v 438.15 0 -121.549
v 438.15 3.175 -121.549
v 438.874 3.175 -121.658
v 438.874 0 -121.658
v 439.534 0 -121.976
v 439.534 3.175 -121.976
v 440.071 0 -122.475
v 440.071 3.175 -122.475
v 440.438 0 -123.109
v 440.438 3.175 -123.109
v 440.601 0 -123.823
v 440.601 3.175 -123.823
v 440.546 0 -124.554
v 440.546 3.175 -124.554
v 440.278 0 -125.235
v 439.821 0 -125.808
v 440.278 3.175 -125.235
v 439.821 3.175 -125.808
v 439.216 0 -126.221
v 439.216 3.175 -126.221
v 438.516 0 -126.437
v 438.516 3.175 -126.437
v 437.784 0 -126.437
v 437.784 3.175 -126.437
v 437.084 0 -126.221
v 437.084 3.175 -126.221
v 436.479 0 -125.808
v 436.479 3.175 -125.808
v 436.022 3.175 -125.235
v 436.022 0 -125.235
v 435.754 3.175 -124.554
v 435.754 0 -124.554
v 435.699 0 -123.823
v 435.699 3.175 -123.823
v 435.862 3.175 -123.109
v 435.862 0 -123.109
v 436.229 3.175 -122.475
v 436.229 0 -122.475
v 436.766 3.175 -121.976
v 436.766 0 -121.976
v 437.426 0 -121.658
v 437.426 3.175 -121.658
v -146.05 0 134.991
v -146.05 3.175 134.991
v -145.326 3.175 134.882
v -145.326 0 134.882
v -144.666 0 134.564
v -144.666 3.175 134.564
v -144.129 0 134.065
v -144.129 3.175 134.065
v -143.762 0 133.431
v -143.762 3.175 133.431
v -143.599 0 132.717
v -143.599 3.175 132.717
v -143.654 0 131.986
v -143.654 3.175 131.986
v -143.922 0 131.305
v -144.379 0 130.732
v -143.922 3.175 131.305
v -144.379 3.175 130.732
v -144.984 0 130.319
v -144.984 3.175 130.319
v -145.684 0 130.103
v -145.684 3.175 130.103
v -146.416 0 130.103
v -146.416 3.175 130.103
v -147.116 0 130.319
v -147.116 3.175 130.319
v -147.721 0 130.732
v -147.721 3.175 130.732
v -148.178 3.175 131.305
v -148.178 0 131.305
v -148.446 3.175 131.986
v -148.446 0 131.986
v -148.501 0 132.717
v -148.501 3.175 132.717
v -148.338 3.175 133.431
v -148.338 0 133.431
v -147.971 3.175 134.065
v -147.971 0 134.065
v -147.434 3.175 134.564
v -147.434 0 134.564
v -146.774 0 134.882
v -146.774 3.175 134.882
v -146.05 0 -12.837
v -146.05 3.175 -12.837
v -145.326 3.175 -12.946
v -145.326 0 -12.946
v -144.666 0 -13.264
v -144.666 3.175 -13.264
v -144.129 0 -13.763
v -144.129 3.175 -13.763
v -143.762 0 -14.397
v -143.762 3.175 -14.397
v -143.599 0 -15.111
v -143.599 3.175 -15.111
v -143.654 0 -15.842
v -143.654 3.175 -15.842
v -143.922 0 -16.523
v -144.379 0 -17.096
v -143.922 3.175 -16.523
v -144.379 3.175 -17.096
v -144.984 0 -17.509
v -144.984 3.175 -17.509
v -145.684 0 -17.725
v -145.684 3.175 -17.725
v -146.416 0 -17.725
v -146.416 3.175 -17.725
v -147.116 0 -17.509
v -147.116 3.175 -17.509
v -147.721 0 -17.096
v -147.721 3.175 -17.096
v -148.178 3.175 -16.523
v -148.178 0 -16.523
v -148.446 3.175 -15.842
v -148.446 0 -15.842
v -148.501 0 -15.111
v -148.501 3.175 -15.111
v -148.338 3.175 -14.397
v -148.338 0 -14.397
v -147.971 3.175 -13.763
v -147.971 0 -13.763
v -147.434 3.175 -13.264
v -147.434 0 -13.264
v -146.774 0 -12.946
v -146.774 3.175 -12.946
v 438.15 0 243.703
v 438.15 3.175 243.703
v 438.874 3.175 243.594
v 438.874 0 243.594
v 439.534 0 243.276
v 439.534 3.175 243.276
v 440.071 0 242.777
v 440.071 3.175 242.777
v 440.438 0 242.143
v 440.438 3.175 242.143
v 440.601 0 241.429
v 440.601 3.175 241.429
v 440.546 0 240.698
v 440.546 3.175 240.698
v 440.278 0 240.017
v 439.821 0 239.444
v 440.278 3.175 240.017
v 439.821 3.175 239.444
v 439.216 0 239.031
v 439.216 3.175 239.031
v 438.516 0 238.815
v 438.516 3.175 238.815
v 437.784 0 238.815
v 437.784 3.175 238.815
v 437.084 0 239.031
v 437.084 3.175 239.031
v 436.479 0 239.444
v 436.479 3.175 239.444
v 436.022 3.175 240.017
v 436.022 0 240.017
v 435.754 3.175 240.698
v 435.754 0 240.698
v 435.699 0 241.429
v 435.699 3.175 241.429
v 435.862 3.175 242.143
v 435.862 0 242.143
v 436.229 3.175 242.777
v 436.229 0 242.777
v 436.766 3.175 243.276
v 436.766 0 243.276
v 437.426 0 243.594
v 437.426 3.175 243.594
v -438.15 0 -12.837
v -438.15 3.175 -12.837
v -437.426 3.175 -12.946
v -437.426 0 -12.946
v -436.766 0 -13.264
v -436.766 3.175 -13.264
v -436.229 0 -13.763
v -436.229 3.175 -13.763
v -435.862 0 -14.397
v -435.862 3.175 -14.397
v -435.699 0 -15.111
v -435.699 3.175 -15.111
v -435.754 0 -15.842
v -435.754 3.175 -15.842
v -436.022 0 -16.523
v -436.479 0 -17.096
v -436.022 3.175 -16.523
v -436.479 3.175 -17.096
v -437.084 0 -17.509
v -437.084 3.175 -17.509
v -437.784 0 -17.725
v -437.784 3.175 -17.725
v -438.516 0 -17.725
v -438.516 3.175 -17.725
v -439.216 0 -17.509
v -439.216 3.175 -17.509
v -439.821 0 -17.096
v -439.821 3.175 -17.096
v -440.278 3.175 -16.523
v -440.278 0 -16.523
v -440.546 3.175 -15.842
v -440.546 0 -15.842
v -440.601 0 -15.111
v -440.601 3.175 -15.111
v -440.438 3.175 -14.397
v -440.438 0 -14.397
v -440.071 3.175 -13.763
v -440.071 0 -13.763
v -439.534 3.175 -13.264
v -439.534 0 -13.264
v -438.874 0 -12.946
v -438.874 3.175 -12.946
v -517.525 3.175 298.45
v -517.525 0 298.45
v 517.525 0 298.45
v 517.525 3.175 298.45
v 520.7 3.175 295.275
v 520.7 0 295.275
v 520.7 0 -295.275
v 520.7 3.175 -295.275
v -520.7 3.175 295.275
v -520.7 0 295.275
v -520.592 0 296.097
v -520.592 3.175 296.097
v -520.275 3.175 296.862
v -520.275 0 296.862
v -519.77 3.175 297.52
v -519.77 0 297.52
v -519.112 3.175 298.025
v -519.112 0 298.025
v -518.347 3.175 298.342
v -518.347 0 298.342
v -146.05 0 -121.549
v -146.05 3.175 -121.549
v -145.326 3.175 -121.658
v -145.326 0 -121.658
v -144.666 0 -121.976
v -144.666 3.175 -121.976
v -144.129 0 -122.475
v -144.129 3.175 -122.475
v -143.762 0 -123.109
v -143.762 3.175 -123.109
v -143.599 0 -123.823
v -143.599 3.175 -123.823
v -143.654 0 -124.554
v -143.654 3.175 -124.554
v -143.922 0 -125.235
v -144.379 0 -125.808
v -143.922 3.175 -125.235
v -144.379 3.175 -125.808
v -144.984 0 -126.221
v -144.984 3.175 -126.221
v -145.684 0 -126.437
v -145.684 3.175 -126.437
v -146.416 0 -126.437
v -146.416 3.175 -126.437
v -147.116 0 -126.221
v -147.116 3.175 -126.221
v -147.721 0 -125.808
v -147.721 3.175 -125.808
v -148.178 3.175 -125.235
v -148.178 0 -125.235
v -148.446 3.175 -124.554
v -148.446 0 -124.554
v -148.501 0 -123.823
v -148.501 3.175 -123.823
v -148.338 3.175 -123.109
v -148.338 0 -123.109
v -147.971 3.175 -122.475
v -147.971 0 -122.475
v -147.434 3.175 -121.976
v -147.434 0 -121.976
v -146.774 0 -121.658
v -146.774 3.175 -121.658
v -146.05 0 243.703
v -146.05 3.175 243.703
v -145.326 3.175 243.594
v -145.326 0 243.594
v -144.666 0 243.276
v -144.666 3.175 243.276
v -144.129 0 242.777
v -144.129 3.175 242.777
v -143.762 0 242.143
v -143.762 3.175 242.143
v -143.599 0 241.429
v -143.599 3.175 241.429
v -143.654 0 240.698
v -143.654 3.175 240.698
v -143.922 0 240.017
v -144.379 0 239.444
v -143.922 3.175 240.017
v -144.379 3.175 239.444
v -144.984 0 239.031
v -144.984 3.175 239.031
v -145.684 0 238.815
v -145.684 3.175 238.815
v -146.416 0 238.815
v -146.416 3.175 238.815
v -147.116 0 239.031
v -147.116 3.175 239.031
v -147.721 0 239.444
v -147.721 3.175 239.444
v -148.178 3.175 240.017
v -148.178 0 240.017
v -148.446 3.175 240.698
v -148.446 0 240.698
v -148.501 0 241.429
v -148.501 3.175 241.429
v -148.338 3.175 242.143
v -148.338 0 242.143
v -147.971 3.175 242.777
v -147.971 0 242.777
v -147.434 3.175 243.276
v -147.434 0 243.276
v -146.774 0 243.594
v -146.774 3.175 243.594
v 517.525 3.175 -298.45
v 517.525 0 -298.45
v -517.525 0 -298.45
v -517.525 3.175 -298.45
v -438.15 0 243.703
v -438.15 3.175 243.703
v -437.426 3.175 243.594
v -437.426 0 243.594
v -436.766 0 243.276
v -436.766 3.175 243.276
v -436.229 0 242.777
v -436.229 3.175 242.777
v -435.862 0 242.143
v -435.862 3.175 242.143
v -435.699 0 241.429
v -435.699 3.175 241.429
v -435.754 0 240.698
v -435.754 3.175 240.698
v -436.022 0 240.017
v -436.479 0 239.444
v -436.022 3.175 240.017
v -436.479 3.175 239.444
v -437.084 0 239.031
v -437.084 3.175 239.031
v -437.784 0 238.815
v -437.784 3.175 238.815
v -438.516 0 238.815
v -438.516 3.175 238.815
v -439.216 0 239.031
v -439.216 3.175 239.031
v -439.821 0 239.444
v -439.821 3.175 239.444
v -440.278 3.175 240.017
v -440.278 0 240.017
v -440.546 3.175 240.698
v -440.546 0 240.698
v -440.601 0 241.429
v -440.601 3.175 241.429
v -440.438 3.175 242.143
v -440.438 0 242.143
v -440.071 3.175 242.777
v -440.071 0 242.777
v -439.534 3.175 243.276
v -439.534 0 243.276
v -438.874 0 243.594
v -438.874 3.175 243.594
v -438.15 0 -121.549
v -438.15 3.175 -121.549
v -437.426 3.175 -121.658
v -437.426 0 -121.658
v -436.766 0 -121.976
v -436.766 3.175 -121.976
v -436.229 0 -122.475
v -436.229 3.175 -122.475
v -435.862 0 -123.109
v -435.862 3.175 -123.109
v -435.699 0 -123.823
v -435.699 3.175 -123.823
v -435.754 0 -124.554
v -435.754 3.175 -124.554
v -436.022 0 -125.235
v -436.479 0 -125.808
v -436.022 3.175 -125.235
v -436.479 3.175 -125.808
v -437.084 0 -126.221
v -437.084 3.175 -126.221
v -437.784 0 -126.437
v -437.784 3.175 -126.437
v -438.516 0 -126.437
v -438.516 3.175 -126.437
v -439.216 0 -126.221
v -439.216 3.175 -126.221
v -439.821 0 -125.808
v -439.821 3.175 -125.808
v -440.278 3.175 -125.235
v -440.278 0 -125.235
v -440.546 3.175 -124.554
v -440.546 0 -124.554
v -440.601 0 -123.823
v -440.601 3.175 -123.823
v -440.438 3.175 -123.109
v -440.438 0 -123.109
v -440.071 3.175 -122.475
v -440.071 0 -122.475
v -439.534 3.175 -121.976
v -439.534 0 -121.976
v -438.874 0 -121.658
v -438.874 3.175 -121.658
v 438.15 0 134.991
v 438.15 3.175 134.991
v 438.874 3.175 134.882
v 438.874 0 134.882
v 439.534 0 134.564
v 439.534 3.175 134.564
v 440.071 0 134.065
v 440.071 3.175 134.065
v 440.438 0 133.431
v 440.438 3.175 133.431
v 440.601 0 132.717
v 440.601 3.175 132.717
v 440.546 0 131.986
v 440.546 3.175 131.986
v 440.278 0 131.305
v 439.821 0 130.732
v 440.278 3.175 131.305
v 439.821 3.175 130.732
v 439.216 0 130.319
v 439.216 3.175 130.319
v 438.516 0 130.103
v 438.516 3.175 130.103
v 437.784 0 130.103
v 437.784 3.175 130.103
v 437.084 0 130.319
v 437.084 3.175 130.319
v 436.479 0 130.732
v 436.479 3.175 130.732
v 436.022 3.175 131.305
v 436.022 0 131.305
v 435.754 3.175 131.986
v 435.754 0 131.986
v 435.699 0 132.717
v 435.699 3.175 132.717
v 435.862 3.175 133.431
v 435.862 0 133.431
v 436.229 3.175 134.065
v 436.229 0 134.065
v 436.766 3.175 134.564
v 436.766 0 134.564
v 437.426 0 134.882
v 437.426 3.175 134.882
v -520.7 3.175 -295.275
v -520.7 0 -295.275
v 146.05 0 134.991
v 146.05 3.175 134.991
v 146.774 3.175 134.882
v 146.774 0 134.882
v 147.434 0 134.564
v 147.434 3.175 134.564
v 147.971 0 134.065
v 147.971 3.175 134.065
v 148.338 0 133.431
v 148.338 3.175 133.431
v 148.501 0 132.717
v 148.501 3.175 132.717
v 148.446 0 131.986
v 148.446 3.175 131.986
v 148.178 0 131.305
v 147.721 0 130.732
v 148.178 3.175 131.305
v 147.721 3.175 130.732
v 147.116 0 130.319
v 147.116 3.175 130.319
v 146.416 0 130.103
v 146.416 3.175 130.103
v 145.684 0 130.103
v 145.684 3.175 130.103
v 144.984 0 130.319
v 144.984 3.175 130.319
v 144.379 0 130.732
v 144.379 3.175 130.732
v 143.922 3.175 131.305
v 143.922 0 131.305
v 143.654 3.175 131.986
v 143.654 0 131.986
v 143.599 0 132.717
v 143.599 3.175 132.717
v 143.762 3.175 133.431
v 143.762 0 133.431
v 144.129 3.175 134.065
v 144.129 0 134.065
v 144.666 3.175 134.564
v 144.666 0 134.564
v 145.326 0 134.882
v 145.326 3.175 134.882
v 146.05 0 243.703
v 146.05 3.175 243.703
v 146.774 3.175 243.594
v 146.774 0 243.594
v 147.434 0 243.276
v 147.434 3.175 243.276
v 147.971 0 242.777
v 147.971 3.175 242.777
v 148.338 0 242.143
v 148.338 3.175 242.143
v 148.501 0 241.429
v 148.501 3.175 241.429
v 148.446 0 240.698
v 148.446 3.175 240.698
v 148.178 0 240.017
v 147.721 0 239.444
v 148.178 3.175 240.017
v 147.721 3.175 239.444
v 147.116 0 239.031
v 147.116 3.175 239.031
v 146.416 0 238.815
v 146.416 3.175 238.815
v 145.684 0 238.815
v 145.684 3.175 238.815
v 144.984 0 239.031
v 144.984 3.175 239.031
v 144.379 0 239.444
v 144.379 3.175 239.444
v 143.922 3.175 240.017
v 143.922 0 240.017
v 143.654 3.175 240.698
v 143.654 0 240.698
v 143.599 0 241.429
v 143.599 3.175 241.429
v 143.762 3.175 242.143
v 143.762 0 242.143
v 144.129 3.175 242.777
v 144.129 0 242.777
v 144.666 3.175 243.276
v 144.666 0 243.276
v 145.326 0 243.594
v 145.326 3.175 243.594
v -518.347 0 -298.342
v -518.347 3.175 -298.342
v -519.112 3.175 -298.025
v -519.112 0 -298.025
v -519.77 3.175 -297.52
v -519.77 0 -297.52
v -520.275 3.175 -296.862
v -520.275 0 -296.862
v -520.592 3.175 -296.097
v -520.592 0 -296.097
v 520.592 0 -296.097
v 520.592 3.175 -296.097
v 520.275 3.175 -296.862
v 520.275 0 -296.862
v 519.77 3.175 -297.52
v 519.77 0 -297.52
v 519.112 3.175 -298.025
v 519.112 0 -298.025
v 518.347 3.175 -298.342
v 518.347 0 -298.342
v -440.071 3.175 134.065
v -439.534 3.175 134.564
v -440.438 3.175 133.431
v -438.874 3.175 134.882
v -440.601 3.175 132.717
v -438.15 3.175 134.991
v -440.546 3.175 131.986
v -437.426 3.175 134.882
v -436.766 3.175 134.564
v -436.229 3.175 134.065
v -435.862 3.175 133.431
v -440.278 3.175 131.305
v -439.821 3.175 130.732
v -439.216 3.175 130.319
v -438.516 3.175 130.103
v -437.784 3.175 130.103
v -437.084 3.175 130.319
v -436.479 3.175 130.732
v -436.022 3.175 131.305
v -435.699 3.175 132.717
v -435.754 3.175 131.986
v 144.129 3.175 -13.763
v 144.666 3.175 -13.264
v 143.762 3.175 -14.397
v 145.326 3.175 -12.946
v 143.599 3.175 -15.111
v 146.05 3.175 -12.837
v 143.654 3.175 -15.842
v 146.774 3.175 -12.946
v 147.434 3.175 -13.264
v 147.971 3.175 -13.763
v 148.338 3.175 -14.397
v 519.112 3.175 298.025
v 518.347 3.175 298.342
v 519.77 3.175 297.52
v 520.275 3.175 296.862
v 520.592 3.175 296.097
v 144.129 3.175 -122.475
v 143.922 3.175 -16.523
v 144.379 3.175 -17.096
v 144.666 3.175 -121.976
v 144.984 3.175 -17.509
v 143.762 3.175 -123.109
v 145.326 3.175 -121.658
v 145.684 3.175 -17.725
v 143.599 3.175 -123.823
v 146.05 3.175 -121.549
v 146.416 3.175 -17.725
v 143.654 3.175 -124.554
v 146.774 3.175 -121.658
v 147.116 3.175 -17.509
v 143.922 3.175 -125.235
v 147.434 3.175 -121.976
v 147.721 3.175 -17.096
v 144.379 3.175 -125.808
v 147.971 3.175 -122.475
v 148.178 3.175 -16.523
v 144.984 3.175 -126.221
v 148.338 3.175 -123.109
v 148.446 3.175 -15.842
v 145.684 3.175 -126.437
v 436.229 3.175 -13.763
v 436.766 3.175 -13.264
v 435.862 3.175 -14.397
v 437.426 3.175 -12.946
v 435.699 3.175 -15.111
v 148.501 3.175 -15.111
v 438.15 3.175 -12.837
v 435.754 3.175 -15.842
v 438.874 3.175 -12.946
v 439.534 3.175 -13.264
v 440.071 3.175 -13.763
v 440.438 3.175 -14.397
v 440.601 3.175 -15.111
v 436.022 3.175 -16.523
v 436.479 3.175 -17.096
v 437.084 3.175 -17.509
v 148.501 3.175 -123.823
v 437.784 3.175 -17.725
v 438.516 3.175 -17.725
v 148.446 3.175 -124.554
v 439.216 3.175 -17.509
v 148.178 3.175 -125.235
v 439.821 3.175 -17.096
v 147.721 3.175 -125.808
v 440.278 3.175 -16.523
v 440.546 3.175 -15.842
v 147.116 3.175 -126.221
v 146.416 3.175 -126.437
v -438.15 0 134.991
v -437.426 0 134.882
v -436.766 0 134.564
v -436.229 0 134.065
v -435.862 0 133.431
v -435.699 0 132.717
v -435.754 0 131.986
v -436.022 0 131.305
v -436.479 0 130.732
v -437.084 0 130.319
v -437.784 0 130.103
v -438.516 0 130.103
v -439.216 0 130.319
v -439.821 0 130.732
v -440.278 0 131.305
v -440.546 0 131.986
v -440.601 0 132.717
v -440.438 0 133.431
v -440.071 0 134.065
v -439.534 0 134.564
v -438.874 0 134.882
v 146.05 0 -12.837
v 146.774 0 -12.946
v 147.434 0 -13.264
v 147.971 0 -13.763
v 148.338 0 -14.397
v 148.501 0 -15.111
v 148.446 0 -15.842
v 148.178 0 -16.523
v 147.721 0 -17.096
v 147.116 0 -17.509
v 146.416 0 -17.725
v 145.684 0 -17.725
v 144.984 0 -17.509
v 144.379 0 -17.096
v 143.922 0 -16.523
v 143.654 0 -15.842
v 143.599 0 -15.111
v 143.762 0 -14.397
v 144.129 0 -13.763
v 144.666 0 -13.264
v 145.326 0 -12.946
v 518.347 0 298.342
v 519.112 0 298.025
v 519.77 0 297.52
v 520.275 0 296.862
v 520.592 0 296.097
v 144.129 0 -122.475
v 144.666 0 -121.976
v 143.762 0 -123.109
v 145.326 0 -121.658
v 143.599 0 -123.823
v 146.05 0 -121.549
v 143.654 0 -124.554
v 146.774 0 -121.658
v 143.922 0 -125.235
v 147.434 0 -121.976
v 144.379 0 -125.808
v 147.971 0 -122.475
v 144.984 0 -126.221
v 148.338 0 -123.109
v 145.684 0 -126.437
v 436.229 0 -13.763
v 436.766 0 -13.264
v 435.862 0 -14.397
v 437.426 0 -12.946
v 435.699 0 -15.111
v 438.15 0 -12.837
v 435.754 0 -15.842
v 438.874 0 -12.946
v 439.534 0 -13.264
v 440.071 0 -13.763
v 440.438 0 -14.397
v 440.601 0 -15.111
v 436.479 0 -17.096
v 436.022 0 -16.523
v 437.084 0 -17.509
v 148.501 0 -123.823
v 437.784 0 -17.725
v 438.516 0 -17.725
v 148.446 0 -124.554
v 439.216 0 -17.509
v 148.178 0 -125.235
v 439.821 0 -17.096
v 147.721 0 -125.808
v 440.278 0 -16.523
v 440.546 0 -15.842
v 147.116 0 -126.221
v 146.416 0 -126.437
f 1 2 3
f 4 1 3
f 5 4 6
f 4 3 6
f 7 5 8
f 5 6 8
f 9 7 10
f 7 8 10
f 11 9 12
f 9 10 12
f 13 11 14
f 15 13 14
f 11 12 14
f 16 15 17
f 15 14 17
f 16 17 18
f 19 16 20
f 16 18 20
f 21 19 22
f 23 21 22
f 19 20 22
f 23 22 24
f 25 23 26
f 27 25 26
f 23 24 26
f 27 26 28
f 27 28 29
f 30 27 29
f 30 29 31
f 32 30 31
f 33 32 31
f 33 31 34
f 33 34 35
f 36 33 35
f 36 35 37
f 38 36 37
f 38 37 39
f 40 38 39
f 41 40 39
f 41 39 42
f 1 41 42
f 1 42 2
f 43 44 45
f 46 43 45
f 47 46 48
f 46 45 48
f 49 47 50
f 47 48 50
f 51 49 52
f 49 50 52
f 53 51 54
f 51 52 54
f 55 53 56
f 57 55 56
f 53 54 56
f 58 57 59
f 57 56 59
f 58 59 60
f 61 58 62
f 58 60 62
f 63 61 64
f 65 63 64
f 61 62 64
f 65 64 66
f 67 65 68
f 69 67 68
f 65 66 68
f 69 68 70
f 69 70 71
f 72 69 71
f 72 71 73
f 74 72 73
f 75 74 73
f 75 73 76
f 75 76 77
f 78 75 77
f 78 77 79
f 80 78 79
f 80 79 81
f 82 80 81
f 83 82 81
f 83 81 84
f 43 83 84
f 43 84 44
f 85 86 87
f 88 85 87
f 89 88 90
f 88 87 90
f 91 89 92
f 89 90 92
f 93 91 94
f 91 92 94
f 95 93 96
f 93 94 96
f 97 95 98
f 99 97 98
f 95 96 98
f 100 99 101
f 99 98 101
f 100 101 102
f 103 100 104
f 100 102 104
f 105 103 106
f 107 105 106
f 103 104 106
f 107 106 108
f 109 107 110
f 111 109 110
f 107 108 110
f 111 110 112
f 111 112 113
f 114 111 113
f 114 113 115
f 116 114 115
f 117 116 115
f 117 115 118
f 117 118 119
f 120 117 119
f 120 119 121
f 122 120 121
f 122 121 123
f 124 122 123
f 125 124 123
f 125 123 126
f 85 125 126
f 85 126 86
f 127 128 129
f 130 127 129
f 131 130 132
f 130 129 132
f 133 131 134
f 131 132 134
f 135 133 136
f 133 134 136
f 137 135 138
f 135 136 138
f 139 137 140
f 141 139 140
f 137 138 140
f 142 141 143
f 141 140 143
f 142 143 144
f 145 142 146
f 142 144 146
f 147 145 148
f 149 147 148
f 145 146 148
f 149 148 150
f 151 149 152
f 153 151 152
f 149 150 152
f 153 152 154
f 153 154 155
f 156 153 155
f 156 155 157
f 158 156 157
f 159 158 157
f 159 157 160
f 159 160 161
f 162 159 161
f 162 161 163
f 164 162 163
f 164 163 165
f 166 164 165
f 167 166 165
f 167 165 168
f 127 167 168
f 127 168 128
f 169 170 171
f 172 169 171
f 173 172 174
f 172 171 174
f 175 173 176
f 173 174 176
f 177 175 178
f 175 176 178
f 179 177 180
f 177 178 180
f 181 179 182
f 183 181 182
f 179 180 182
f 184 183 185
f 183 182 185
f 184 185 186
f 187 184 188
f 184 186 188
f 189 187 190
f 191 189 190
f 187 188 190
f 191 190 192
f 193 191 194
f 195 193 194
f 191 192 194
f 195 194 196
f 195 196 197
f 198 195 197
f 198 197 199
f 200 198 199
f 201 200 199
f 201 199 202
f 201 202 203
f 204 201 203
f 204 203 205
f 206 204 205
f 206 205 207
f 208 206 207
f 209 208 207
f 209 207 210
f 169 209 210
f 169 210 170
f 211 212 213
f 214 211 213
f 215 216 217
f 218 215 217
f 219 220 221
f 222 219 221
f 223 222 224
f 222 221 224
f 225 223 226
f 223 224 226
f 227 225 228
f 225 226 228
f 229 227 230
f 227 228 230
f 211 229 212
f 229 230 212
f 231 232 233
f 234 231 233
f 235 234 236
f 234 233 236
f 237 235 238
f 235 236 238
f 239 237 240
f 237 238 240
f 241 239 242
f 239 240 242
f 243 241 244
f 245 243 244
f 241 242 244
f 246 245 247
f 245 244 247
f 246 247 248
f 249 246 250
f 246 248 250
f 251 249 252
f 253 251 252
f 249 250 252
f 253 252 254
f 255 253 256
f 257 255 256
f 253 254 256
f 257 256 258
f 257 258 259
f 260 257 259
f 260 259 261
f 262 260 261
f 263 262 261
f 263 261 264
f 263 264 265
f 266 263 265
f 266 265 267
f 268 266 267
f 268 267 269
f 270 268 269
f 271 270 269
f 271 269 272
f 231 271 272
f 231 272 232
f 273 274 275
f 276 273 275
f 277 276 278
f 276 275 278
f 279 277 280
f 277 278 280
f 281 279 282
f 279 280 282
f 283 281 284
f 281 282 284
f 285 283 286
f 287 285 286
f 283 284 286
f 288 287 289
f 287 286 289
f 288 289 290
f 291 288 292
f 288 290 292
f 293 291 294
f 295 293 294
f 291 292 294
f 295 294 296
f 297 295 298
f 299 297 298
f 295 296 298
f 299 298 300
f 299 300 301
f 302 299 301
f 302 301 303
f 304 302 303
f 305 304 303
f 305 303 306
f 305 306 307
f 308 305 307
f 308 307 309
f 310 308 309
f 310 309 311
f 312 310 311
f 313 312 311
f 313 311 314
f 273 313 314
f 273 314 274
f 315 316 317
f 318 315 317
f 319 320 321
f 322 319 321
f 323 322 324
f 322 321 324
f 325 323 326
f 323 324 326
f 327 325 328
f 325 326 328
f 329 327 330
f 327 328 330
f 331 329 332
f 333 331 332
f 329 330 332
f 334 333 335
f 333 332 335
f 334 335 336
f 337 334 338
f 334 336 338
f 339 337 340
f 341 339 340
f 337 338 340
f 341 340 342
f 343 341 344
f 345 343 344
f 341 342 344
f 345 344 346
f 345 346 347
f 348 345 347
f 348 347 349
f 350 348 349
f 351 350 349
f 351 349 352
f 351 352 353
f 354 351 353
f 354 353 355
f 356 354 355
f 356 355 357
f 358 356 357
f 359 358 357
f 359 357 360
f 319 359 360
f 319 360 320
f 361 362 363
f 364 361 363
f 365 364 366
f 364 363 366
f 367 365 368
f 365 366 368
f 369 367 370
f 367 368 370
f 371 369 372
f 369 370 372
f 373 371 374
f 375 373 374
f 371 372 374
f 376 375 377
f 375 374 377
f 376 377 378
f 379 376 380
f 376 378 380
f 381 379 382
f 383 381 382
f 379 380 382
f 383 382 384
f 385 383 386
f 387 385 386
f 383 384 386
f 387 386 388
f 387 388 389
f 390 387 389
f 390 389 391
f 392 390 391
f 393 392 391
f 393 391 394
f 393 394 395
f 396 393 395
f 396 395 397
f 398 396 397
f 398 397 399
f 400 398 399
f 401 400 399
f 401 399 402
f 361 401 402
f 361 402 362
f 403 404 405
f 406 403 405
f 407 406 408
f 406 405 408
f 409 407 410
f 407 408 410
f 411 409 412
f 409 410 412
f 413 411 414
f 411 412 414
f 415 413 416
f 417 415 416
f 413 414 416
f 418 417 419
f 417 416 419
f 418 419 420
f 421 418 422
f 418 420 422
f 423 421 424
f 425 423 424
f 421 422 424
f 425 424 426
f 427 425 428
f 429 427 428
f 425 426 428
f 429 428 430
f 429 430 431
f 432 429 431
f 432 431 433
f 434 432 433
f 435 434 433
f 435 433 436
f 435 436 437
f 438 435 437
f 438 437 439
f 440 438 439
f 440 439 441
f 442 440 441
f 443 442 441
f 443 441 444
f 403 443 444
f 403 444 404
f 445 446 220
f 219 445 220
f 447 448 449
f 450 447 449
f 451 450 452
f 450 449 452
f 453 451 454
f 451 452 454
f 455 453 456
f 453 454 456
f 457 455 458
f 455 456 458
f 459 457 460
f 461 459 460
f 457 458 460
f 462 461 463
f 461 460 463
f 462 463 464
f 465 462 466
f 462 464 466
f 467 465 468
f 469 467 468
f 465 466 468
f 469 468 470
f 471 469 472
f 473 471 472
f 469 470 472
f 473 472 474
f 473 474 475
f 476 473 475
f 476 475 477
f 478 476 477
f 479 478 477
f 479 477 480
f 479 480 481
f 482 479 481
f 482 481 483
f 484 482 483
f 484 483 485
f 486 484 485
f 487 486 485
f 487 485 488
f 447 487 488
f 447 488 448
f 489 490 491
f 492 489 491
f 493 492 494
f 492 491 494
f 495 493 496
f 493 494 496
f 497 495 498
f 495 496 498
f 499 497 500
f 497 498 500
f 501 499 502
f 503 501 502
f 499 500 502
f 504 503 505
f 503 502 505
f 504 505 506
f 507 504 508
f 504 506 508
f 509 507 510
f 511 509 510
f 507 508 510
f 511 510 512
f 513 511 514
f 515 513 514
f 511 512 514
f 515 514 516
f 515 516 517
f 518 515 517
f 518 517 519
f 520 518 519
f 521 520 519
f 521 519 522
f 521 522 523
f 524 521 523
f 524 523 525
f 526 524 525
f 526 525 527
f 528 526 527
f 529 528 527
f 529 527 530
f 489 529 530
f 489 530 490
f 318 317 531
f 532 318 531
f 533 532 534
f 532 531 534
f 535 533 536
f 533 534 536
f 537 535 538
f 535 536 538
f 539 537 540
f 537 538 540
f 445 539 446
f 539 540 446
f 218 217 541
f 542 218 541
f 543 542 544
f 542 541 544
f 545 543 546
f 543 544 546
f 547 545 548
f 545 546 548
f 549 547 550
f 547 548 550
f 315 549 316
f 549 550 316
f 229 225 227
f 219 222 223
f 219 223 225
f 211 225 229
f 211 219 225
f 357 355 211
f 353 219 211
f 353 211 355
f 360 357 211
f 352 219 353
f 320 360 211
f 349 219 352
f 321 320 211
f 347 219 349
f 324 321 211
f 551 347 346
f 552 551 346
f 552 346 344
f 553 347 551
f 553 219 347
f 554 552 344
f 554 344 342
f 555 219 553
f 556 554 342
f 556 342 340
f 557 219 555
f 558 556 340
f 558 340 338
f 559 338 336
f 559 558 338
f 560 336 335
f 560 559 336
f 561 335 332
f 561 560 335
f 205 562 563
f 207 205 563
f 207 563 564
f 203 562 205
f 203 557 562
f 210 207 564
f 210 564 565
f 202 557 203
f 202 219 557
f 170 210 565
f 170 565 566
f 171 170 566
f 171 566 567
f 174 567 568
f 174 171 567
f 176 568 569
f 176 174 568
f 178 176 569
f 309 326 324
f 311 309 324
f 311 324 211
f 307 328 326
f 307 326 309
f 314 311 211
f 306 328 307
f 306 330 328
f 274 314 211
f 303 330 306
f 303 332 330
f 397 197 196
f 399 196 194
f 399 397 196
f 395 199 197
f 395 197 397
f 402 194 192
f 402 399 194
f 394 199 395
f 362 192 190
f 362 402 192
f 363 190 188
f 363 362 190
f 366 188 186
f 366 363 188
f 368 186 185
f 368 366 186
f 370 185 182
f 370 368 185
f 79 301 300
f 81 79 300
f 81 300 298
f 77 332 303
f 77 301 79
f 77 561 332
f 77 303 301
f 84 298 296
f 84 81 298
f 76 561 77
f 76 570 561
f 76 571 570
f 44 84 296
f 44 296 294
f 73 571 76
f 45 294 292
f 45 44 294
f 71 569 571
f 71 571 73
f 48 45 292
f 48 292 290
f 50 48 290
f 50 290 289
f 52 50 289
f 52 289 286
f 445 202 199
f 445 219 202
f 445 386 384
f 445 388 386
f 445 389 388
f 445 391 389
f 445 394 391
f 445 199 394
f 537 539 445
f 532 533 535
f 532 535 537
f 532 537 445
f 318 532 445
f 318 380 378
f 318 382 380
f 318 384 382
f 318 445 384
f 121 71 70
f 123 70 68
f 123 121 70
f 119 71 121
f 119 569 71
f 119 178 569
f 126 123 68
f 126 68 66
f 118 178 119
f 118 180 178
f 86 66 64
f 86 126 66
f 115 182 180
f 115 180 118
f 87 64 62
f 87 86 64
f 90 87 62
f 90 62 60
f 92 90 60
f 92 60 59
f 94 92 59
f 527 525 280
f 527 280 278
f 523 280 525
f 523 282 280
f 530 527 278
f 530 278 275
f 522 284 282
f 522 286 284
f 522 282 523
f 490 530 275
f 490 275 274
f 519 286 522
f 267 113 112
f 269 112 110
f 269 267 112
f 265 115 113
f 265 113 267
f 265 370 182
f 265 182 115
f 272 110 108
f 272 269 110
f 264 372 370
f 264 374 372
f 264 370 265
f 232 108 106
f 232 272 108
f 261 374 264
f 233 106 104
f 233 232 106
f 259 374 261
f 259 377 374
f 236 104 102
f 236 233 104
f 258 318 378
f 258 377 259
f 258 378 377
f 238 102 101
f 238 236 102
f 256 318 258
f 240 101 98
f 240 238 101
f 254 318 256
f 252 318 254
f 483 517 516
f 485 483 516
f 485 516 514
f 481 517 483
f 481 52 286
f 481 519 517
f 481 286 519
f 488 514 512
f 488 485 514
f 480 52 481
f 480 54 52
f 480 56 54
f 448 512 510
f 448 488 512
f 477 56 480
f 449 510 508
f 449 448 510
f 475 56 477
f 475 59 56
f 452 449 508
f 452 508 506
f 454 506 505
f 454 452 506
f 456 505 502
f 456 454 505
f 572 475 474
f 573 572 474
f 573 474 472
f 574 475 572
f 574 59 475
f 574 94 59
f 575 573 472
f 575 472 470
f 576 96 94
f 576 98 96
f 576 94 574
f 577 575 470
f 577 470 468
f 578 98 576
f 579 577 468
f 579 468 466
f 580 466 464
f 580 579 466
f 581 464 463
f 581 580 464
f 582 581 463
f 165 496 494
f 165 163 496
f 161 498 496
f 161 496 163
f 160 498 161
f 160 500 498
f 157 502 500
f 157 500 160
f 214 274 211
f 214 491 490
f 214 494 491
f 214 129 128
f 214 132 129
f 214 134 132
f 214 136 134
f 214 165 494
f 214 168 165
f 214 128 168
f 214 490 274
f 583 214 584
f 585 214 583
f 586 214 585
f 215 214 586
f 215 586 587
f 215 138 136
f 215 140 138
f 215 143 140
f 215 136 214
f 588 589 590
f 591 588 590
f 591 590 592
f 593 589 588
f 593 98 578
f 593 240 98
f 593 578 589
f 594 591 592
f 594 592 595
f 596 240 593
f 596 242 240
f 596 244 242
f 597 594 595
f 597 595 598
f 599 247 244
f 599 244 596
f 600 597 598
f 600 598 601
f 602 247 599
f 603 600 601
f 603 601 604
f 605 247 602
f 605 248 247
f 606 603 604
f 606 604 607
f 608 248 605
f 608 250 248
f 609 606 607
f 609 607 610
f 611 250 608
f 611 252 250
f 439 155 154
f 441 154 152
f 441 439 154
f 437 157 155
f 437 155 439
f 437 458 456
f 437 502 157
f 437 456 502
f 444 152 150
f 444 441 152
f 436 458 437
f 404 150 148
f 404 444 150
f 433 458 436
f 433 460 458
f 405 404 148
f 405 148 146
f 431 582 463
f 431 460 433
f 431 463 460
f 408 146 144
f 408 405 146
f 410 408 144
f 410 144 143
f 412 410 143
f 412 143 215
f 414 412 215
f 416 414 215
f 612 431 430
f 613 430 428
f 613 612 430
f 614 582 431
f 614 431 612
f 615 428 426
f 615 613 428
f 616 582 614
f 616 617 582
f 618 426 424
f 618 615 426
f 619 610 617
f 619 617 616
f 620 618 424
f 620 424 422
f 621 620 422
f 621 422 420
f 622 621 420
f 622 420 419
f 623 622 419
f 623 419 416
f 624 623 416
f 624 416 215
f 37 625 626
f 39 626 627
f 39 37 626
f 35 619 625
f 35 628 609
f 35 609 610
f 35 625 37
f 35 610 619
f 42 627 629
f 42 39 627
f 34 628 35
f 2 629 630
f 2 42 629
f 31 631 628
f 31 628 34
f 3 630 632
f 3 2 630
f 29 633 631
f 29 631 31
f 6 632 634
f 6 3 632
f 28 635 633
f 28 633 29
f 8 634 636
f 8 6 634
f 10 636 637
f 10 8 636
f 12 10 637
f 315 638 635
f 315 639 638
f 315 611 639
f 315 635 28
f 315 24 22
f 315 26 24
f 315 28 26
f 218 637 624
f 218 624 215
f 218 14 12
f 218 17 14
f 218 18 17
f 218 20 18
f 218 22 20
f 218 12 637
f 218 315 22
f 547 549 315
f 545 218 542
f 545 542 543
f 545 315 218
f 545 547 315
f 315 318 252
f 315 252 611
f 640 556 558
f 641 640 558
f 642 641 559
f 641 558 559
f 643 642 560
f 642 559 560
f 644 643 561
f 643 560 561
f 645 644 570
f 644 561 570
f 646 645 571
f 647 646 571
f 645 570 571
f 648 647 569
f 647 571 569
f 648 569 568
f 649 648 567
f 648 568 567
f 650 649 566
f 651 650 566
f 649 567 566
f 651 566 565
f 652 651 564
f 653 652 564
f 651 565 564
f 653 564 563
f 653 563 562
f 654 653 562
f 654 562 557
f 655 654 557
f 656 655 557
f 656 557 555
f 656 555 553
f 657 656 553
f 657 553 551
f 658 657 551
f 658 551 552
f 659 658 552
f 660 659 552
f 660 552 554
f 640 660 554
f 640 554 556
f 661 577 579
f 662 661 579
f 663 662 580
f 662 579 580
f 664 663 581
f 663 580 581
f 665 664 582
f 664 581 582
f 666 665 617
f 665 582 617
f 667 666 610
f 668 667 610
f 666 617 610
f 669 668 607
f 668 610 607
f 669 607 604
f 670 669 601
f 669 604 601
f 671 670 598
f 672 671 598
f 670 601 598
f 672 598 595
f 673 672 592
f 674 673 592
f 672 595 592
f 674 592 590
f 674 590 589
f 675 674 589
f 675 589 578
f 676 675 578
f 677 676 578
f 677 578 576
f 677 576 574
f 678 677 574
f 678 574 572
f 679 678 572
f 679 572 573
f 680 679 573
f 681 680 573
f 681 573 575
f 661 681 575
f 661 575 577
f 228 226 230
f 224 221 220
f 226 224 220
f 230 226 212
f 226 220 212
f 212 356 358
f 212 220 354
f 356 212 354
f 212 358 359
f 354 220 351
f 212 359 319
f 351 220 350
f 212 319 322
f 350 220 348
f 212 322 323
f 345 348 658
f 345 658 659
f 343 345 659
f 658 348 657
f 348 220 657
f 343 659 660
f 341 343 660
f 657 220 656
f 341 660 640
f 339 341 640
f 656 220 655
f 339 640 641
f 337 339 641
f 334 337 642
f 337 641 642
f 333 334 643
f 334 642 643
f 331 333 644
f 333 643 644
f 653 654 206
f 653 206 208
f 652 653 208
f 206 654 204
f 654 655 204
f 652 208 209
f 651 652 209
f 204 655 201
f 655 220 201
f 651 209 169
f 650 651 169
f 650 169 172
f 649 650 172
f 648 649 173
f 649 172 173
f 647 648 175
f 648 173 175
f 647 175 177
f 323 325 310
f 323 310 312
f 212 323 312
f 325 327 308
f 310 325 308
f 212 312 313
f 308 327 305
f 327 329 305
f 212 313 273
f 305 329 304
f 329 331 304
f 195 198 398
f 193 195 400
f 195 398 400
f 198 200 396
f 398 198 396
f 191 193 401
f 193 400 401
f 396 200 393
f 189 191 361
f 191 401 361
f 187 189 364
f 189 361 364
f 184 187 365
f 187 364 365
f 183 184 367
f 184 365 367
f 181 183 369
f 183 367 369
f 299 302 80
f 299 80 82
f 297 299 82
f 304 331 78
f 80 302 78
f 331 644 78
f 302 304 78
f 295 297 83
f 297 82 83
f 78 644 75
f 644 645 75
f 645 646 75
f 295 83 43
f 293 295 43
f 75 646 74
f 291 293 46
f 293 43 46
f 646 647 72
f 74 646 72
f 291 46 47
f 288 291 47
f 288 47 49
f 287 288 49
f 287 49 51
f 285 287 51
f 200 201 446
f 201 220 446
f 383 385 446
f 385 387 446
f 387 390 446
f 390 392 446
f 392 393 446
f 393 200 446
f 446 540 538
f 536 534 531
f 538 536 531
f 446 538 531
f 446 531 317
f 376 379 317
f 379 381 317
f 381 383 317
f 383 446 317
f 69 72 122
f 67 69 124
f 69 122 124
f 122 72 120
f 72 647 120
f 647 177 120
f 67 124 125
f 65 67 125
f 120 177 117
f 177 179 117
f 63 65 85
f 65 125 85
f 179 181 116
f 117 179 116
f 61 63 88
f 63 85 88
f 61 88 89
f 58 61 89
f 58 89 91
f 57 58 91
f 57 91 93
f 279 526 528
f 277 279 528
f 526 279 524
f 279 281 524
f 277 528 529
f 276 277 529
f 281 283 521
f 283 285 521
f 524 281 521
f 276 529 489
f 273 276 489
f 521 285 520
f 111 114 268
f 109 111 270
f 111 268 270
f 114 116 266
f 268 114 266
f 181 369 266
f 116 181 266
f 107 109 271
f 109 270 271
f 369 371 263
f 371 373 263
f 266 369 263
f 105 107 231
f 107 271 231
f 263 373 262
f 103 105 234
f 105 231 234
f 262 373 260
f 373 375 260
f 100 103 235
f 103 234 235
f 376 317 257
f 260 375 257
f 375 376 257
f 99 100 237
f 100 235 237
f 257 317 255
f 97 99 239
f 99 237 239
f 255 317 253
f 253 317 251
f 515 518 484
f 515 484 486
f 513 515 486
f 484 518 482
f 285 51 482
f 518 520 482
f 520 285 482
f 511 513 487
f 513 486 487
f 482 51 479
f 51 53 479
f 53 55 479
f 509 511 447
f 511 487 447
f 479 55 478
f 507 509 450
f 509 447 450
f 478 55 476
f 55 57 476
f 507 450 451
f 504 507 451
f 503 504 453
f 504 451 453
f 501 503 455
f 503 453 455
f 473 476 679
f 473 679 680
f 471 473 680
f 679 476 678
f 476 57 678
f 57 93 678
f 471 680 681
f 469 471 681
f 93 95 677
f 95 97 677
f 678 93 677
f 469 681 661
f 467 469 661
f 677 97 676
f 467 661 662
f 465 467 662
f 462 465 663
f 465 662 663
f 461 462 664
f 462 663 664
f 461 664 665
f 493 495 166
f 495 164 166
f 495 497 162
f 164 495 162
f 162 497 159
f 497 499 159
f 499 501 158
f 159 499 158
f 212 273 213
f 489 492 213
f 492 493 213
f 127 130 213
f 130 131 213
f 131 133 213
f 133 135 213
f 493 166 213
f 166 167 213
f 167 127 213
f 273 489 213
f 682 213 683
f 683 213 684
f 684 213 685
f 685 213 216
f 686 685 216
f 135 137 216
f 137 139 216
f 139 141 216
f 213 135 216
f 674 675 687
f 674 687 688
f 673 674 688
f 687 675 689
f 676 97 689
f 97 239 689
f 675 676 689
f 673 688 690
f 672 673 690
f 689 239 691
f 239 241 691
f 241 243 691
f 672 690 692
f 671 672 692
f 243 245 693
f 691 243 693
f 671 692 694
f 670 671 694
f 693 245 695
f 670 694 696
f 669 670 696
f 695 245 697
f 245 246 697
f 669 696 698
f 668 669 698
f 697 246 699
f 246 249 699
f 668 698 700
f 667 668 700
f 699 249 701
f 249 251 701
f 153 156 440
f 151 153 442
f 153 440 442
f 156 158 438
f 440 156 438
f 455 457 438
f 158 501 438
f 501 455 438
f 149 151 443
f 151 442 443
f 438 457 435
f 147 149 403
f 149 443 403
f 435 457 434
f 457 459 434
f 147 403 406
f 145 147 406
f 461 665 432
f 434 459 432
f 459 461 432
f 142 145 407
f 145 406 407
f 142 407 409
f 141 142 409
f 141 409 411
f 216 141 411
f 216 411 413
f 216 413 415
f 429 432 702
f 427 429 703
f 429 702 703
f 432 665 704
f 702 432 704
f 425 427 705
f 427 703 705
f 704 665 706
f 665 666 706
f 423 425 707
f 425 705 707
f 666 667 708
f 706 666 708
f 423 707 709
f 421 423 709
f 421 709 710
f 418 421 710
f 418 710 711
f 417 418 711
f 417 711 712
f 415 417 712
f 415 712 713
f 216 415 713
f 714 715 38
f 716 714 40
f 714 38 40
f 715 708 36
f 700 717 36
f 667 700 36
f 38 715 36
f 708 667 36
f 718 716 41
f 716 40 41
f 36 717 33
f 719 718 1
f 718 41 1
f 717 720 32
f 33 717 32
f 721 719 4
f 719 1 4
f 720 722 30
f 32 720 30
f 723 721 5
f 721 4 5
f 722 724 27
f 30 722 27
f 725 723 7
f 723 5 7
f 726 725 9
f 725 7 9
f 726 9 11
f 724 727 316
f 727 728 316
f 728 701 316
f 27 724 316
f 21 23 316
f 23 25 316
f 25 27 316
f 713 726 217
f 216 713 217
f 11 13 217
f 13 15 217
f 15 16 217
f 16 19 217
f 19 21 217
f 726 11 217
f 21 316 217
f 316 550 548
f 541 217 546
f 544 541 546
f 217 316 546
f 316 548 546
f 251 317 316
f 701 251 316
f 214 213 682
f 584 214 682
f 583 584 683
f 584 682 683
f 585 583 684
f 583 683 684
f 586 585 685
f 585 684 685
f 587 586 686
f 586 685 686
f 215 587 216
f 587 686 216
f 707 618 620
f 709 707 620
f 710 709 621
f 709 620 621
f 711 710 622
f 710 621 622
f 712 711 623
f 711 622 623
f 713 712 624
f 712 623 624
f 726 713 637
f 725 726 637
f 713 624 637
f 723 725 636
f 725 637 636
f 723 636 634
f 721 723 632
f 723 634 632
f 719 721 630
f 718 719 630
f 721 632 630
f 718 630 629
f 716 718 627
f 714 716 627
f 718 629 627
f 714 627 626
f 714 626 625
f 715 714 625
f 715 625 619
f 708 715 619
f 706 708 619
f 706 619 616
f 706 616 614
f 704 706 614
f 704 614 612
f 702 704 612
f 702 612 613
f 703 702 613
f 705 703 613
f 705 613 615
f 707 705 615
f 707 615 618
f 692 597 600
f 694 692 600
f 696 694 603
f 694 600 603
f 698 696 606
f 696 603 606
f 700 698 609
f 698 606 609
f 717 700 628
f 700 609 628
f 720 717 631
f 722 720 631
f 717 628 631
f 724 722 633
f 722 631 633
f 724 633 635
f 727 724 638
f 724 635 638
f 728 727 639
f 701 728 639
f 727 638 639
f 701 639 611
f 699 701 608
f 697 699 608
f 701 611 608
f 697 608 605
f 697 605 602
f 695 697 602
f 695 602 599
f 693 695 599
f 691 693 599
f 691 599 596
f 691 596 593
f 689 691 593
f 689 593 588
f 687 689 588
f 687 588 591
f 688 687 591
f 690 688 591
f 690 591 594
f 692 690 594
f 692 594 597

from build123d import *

# Parameters (mm, degrees)
BOSS_EXTRUDE1_DEPTH          = 3.175
F_10_0_1935_DIAMETER_HOLE1_D = 4.9149


with BuildPart() as part:
    # Sketch1 → Boss-Extrude1 (new body)
    with BuildSketch(Plane(origin=(0, 0, 0), x_dir=(1, 0, 0), z_dir=(0, 1, 0))):
        with BuildLine():
            Line((-517.525, -298.45), (517.525, -298.45))
            ThreePointArc((517.525, -298.45), (519.77006403, -297.52006403), (520.7, -295.275))
            Line((520.7, -295.275), (520.7, 295.275))
            ThreePointArc((520.7, 295.275), (519.77006403, 297.52006403), (517.525, 298.45))
            Line((517.525, 298.45), (-517.525, 298.45))
            ThreePointArc((-517.525, 298.45), (-519.77006403, 297.52006403), (-520.7, 295.275))
            Line((-520.7, 295.275), (-520.7, -295.275))
            ThreePointArc((-520.7, -295.275), (-519.77006403, -297.52006403), (-517.525, -298.45))
        make_face()
    extrude(amount=BOSS_EXTRUDE1_DEPTH)

    # #10 (0.1935) Diameter Hole1 (through all)
    with Locations(Plane(origin=(-438.15, 0, 241.245275247), x_dir=(0, 0, -1), z_dir=(0, -1, 0))):
        with Locations((0, 0), (108.712, 0), (0, 292.1), (108.712, 292.1), (0, 584.2), (108.712, 584.2), (0, 876.3), (108.712, 876.3), (256.539999992, 876.3), (365.251999992, 876.3), (256.539999992, 584.2), (365.251999992, 584.2), (365.251999992, 292.1), (256.539999992, 292.1), (256.539999992, 0), (365.251999992, 0)):
            Hole(F_10_0_1935_DIAMETER_HOLE1_D / 2)


solid = part.part
